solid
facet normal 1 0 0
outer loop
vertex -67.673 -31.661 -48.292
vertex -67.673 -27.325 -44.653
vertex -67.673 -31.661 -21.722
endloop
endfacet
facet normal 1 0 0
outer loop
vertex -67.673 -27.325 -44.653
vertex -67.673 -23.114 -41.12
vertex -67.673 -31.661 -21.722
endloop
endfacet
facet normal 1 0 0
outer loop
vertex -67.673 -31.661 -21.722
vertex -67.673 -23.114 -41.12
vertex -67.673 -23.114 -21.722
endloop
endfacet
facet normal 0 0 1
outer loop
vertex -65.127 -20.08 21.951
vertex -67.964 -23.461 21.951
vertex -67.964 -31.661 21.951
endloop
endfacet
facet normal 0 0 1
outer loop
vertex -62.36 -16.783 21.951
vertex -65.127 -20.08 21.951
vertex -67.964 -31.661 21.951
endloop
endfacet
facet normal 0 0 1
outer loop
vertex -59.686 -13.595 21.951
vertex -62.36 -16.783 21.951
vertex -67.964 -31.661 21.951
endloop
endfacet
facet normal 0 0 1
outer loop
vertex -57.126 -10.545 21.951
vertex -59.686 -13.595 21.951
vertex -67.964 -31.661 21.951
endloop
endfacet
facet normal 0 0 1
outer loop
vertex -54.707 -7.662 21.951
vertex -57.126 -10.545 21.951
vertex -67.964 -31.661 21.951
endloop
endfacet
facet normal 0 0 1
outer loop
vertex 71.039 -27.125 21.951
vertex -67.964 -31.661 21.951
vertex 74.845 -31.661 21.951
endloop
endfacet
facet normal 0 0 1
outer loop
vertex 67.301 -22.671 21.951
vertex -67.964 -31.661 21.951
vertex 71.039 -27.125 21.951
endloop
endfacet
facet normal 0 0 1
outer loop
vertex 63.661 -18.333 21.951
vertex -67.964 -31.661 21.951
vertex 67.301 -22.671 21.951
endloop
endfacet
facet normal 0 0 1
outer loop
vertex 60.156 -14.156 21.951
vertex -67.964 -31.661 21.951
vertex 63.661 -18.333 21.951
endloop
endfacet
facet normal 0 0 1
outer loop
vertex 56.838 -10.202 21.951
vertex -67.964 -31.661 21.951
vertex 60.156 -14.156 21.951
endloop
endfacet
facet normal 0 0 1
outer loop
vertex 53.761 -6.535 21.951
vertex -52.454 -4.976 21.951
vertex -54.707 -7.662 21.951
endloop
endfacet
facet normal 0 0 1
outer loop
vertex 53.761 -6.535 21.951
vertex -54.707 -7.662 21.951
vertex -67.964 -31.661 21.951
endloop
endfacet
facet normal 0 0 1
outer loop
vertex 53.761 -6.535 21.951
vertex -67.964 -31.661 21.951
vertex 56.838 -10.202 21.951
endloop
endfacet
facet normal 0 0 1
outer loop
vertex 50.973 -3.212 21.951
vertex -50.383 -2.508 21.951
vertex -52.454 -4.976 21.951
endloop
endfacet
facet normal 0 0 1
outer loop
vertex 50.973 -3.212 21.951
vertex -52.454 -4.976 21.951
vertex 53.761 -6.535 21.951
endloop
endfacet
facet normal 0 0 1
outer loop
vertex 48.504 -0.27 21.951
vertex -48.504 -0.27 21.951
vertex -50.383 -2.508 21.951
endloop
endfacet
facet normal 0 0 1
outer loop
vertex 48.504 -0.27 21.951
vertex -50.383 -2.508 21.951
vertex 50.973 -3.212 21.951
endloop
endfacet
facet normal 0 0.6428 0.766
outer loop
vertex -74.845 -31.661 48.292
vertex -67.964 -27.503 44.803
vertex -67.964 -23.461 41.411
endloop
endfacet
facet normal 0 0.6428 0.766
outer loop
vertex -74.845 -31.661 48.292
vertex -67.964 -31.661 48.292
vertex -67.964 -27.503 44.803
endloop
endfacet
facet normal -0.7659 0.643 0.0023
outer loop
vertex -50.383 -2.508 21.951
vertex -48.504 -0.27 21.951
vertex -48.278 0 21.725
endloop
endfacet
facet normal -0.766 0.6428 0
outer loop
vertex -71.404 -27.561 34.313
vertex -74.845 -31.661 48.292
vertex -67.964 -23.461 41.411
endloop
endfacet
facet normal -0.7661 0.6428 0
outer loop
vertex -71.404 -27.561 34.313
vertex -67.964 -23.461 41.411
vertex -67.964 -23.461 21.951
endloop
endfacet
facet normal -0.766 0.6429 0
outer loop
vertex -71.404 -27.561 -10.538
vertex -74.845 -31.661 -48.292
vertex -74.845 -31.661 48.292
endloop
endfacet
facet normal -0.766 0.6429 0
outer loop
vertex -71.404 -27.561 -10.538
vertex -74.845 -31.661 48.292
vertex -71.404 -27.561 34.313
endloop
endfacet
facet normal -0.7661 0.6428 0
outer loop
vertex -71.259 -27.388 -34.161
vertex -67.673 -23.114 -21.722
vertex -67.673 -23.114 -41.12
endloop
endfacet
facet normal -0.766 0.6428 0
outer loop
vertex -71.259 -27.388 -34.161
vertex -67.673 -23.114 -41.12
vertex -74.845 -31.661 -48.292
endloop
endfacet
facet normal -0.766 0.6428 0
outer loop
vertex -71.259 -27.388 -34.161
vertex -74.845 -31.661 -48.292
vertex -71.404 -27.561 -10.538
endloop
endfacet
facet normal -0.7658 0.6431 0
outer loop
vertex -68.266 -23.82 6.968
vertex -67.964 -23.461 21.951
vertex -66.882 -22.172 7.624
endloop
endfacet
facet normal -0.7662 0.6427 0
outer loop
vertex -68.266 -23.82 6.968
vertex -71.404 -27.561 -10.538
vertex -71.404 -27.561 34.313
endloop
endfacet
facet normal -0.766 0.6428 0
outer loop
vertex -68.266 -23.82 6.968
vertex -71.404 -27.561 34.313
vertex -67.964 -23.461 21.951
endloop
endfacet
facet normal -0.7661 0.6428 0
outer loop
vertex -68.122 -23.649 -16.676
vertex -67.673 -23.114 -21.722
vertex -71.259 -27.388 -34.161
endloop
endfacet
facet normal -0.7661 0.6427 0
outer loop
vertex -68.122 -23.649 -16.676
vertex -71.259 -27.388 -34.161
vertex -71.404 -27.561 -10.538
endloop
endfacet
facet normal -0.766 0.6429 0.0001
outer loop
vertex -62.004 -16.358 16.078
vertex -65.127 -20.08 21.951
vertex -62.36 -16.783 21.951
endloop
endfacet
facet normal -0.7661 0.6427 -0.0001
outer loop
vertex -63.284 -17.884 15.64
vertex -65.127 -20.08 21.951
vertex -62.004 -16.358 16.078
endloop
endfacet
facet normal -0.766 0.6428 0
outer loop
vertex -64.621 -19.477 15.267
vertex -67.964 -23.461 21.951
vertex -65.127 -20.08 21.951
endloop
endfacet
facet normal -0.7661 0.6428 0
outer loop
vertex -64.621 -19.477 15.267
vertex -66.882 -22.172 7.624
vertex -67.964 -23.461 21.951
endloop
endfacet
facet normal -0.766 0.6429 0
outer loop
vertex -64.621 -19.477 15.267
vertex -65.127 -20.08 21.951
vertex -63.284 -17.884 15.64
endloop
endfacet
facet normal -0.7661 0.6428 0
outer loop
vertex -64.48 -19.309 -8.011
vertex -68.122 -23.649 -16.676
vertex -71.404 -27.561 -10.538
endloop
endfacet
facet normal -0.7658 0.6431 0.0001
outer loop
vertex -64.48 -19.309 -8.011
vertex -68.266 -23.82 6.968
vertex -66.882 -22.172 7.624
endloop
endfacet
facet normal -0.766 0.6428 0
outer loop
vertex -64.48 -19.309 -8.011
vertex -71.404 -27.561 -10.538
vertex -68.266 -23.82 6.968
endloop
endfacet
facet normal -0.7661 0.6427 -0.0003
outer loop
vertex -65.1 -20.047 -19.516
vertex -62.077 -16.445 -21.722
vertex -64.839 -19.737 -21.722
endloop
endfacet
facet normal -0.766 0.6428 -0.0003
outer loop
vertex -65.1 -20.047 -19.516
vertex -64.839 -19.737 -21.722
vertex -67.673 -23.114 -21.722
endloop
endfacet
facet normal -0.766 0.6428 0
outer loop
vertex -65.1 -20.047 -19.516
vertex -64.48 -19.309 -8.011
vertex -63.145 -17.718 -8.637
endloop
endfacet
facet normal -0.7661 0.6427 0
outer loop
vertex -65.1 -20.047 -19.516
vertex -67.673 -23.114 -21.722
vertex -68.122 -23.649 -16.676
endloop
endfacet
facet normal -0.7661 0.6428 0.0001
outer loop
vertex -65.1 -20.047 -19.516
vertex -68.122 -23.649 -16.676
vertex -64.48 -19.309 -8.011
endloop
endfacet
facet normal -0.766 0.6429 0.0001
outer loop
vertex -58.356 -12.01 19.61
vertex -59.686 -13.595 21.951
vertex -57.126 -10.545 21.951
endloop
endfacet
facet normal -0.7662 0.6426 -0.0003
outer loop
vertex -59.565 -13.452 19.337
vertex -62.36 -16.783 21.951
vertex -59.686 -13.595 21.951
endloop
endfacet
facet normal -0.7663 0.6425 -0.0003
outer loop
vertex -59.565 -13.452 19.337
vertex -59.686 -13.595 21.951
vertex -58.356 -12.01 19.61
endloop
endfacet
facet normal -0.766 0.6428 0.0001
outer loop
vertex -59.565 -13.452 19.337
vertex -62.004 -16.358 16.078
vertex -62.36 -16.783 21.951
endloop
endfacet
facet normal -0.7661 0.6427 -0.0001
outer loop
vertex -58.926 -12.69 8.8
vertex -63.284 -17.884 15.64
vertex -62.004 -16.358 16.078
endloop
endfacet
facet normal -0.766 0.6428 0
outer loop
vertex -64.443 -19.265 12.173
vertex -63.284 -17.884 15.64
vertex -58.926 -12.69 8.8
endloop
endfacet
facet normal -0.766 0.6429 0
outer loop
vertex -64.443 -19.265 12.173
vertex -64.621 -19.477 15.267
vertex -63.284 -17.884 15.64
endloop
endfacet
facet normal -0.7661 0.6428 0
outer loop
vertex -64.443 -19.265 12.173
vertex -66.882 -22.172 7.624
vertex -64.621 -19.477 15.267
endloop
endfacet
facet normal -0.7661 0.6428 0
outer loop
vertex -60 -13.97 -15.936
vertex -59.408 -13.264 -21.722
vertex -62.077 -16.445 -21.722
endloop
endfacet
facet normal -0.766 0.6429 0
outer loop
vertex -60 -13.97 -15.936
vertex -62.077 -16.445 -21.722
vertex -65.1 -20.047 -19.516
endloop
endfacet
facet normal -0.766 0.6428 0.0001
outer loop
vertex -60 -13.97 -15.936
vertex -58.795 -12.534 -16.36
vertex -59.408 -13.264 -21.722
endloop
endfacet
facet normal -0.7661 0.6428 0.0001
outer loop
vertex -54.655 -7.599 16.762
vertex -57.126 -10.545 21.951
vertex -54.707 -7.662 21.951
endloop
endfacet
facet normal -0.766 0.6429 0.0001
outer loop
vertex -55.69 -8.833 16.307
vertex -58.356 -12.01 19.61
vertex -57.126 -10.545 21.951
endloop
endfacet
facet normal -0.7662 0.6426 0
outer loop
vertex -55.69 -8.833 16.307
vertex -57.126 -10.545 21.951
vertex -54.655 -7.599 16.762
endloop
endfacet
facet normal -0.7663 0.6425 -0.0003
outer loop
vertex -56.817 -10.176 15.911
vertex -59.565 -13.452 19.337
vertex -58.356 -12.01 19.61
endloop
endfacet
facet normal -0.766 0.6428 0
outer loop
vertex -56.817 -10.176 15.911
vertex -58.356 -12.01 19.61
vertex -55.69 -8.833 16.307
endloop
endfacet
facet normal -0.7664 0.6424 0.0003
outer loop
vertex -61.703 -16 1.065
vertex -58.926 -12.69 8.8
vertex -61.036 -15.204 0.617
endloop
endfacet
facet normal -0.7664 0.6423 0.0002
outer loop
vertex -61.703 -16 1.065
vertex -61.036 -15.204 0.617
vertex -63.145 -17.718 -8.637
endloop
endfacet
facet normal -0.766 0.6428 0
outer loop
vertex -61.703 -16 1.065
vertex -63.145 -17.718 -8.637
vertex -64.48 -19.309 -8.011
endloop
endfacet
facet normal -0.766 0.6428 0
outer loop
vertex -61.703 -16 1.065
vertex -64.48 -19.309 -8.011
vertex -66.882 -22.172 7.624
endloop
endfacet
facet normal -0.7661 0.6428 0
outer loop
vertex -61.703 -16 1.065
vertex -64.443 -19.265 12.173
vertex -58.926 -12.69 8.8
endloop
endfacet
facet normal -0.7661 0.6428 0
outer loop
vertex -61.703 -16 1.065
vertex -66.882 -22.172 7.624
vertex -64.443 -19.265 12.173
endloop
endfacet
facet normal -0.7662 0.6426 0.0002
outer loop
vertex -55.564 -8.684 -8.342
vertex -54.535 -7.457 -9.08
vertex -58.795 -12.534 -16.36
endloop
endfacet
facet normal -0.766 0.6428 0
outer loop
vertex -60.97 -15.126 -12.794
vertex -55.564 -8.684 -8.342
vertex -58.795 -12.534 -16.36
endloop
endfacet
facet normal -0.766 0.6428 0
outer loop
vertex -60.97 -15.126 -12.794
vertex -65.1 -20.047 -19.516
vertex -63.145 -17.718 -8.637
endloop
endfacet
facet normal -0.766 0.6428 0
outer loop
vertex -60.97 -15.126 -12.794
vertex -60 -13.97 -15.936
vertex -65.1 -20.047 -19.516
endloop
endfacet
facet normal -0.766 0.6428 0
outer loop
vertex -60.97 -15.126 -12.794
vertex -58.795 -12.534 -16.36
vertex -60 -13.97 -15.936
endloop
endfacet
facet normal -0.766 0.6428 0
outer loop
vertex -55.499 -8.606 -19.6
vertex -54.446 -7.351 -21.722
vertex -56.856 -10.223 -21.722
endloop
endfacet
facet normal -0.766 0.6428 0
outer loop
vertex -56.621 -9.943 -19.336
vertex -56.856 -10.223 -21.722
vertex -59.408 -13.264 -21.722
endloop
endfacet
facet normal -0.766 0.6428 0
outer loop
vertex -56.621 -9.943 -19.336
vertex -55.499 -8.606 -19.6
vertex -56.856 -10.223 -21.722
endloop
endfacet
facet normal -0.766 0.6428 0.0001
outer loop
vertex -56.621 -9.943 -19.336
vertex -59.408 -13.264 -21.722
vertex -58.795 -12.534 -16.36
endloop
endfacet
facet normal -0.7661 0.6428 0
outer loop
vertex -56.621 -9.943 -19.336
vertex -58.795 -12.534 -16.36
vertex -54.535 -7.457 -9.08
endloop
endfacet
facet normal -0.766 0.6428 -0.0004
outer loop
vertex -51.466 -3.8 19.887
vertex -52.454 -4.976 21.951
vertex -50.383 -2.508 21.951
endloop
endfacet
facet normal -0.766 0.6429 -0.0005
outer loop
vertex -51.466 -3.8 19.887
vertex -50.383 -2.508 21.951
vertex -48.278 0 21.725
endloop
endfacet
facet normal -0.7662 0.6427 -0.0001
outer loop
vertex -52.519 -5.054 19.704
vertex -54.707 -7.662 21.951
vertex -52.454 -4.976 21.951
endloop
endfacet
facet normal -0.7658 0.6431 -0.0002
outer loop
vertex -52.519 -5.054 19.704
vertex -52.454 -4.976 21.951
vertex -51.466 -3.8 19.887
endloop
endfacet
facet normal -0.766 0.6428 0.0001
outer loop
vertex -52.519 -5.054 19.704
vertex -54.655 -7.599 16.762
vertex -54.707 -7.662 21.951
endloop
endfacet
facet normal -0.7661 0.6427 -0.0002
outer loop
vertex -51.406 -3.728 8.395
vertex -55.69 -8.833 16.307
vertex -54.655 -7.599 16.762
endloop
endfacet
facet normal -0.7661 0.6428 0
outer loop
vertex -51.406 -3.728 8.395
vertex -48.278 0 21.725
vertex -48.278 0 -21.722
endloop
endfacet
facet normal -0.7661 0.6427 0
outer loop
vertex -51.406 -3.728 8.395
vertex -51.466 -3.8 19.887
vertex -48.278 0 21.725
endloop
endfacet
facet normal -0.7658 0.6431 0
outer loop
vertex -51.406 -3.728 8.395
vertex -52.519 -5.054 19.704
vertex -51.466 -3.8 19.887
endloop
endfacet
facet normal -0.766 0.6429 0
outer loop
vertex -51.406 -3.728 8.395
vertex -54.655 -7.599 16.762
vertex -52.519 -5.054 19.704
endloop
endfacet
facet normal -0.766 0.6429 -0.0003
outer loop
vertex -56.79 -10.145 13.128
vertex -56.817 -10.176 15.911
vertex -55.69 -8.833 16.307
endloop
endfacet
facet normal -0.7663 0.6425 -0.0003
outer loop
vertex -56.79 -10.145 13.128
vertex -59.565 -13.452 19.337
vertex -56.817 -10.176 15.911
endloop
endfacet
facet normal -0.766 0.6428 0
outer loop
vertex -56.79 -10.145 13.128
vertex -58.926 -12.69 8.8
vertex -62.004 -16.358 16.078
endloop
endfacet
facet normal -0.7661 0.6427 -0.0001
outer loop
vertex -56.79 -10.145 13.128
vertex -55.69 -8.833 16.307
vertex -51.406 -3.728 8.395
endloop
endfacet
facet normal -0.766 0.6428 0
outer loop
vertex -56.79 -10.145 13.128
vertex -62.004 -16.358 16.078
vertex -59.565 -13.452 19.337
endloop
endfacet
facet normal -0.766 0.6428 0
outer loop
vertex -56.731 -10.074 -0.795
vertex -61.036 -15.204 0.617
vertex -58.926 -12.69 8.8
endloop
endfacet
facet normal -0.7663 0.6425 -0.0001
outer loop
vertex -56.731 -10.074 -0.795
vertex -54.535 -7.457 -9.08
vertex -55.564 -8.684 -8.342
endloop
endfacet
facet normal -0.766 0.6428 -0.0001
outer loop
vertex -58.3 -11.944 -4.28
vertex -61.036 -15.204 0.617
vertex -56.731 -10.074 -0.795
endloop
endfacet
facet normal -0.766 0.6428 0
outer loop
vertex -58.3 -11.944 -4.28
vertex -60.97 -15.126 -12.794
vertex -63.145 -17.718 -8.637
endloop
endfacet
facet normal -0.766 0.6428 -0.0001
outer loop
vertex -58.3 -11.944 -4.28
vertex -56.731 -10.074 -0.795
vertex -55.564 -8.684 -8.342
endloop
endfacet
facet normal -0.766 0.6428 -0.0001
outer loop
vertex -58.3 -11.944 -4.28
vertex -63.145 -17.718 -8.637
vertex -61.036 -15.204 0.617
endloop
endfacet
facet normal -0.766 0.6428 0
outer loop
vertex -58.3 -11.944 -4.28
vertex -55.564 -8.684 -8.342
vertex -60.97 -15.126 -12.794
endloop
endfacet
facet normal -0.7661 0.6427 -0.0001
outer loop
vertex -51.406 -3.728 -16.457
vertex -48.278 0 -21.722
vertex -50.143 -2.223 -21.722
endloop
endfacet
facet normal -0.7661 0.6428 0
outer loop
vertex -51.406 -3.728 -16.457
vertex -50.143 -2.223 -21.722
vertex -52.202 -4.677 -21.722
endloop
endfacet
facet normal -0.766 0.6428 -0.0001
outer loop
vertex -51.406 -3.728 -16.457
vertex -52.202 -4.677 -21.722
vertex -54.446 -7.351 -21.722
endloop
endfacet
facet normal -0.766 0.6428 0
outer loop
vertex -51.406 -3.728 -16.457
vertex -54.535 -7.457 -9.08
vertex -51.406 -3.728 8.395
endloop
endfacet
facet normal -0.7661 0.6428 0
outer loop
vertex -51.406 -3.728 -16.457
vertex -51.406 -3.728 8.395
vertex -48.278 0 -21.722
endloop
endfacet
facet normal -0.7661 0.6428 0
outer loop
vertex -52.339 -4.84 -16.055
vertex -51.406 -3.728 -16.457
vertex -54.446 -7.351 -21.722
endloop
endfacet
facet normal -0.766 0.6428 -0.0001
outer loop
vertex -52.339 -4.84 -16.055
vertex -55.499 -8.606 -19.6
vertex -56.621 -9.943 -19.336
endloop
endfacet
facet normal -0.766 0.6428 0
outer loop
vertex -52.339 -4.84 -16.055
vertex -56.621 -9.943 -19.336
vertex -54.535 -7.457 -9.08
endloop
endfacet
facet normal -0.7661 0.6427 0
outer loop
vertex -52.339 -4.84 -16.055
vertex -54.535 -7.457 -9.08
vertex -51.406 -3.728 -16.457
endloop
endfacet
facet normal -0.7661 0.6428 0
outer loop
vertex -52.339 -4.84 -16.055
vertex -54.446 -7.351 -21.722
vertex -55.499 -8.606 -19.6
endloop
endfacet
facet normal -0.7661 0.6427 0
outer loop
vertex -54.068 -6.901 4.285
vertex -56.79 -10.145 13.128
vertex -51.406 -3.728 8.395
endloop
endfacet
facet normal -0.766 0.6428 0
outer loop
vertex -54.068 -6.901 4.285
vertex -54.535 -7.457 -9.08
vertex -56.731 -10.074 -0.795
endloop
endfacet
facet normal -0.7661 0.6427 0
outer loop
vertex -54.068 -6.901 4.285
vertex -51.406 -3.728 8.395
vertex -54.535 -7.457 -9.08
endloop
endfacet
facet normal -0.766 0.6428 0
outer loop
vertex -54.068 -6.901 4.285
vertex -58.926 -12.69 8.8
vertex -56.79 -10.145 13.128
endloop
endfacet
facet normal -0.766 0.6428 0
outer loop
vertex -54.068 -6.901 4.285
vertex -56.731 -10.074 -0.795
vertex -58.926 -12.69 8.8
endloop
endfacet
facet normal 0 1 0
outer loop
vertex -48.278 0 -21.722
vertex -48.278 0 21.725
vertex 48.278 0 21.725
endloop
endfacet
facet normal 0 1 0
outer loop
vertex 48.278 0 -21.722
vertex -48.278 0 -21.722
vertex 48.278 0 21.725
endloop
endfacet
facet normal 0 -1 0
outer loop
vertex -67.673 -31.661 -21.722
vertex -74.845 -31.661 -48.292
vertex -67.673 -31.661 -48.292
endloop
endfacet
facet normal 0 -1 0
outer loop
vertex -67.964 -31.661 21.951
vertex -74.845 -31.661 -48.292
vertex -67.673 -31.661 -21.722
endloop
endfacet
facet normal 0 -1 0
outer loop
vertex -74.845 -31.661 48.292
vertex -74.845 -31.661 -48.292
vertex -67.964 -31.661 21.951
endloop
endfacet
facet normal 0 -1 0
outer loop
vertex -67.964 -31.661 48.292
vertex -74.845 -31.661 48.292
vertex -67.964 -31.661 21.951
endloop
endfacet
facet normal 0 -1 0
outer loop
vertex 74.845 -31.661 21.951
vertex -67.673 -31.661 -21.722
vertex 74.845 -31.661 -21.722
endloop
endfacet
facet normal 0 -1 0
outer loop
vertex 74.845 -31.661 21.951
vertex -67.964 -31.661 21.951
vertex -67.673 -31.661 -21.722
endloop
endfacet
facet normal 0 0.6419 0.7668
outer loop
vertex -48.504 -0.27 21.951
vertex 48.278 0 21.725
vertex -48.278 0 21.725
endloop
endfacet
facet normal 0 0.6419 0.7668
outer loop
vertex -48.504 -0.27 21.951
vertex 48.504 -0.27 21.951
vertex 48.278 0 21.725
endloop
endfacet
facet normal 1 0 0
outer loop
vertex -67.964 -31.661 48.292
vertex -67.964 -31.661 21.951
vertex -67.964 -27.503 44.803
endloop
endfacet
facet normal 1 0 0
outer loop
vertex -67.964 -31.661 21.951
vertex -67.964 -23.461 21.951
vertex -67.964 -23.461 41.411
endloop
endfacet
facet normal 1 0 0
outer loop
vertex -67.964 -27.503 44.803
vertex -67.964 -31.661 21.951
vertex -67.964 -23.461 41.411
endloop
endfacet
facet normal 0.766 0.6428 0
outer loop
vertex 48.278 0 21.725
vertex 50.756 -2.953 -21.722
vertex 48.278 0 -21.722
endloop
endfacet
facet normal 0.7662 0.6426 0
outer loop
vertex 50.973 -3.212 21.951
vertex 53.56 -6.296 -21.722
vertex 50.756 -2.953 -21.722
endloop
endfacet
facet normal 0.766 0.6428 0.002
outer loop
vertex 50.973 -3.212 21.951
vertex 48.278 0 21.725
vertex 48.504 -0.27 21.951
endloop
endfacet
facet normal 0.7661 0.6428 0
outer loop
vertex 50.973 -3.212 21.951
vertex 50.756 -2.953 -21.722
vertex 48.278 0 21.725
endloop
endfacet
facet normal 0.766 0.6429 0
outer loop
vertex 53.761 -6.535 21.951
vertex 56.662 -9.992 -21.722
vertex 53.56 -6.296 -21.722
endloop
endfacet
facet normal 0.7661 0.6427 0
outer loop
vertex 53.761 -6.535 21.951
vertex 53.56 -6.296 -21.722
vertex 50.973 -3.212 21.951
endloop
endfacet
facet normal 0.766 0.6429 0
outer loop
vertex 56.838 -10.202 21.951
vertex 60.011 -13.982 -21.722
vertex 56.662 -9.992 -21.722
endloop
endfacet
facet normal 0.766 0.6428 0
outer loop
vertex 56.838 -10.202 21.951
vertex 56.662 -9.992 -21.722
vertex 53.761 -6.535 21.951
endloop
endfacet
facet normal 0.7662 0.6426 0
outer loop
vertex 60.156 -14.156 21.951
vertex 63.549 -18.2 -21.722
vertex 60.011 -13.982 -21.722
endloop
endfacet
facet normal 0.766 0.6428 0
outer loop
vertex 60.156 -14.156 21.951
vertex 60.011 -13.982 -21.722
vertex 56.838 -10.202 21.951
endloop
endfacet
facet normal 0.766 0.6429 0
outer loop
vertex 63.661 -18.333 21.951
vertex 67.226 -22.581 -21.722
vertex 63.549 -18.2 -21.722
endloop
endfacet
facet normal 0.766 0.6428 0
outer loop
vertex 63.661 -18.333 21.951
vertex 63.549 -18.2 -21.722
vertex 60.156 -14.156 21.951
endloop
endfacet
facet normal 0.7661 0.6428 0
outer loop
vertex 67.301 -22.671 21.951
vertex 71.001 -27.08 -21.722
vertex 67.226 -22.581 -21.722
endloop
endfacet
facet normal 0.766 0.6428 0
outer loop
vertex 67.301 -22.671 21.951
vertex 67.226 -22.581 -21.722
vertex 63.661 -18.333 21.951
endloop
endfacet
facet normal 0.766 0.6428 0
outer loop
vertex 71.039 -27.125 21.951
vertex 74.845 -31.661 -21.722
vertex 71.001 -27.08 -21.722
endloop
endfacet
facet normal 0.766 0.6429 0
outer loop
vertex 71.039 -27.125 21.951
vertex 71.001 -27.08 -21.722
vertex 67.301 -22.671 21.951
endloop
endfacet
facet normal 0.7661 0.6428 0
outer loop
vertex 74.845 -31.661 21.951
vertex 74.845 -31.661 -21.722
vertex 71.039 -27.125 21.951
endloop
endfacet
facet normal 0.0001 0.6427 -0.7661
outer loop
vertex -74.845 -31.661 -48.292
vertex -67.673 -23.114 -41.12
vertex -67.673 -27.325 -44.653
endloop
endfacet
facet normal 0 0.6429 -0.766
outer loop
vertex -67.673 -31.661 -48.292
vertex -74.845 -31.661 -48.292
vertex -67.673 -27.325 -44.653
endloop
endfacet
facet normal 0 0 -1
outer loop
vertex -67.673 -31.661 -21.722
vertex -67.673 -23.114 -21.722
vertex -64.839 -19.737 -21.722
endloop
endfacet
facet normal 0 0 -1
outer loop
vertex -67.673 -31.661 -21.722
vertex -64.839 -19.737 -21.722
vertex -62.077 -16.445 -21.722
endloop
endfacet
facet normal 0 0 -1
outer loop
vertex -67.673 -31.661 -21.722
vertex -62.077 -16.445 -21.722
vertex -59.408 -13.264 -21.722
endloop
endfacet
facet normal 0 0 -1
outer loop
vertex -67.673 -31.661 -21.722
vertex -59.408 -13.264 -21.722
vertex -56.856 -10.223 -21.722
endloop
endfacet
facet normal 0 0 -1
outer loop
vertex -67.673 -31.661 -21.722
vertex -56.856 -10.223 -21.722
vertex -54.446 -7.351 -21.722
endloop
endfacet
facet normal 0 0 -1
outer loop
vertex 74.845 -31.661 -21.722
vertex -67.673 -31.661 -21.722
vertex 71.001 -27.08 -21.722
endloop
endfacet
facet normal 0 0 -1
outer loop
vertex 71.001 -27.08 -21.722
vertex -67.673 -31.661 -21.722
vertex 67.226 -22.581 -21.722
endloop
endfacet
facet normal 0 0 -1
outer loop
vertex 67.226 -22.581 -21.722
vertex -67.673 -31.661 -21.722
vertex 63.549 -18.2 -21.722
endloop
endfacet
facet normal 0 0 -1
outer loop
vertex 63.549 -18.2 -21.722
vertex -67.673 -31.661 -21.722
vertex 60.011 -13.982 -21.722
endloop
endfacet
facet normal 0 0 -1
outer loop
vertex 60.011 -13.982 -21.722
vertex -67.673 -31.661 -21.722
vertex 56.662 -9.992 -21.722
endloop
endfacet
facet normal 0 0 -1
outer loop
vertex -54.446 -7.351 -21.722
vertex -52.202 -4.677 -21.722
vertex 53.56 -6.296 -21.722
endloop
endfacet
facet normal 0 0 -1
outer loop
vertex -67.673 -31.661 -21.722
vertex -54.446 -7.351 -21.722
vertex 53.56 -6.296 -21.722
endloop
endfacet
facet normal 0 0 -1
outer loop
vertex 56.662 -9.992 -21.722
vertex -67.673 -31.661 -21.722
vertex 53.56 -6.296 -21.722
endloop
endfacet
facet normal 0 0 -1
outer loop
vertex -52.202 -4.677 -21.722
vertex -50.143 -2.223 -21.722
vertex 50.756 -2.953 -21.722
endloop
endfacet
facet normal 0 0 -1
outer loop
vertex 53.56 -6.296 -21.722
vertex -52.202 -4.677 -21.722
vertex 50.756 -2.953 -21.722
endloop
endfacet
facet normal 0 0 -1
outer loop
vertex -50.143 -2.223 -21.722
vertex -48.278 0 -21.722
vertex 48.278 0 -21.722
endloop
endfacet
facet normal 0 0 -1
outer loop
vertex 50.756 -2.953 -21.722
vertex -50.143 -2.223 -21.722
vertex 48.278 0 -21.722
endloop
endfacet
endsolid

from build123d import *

# Parameters (mm, degrees)
F0_W     = 96.55572474
F0_H     = 43.4501469135
F1_DEPTH = 31.6610336304
F1_TAPER = -40
F2_W     = 167.0255586505
F2_H     = 38.3586026728
F2_W_2   = 162.8842428327
F2_H_2   = 31.8540707231
F3_DEPTH = 79.4451162219
F4_W     = 21.1209580302
F4_H     = 32.886043191
F5_DEPTH = 14.5127717406


with BuildPart() as f1:
    # F0 (on Front) → F1 (new body)
    with BuildSketch(Plane.XZ):
        Rectangle(F0_W, F0_H)
    extrude(amount=F1_DEPTH, taper=F1_TAPER)

    # F2 (on Front) → F3 (cut)
    with BuildSketch(Plane.XZ):
        with Locations((15.839908272, -40.9009512514)):
            Rectangle(F2_W, F2_H)
        with Locations((13.4780444205, 37.8784425557)):
            Rectangle(F2_W_2, F2_H_2)
    extrude(amount=F3_DEPTH, mode=Mode.SUBTRACT)

    # F4 (on Front) → F5 (cut)
    with BuildSketch(Plane.XZ):
        with Locations((-66.4090551436, 38.6971160769)):
            Rectangle(F4_W, F4_H)
    extrude(amount=F5_DEPTH, mode=Mode.SUBTRACT)


solid = f1.part
